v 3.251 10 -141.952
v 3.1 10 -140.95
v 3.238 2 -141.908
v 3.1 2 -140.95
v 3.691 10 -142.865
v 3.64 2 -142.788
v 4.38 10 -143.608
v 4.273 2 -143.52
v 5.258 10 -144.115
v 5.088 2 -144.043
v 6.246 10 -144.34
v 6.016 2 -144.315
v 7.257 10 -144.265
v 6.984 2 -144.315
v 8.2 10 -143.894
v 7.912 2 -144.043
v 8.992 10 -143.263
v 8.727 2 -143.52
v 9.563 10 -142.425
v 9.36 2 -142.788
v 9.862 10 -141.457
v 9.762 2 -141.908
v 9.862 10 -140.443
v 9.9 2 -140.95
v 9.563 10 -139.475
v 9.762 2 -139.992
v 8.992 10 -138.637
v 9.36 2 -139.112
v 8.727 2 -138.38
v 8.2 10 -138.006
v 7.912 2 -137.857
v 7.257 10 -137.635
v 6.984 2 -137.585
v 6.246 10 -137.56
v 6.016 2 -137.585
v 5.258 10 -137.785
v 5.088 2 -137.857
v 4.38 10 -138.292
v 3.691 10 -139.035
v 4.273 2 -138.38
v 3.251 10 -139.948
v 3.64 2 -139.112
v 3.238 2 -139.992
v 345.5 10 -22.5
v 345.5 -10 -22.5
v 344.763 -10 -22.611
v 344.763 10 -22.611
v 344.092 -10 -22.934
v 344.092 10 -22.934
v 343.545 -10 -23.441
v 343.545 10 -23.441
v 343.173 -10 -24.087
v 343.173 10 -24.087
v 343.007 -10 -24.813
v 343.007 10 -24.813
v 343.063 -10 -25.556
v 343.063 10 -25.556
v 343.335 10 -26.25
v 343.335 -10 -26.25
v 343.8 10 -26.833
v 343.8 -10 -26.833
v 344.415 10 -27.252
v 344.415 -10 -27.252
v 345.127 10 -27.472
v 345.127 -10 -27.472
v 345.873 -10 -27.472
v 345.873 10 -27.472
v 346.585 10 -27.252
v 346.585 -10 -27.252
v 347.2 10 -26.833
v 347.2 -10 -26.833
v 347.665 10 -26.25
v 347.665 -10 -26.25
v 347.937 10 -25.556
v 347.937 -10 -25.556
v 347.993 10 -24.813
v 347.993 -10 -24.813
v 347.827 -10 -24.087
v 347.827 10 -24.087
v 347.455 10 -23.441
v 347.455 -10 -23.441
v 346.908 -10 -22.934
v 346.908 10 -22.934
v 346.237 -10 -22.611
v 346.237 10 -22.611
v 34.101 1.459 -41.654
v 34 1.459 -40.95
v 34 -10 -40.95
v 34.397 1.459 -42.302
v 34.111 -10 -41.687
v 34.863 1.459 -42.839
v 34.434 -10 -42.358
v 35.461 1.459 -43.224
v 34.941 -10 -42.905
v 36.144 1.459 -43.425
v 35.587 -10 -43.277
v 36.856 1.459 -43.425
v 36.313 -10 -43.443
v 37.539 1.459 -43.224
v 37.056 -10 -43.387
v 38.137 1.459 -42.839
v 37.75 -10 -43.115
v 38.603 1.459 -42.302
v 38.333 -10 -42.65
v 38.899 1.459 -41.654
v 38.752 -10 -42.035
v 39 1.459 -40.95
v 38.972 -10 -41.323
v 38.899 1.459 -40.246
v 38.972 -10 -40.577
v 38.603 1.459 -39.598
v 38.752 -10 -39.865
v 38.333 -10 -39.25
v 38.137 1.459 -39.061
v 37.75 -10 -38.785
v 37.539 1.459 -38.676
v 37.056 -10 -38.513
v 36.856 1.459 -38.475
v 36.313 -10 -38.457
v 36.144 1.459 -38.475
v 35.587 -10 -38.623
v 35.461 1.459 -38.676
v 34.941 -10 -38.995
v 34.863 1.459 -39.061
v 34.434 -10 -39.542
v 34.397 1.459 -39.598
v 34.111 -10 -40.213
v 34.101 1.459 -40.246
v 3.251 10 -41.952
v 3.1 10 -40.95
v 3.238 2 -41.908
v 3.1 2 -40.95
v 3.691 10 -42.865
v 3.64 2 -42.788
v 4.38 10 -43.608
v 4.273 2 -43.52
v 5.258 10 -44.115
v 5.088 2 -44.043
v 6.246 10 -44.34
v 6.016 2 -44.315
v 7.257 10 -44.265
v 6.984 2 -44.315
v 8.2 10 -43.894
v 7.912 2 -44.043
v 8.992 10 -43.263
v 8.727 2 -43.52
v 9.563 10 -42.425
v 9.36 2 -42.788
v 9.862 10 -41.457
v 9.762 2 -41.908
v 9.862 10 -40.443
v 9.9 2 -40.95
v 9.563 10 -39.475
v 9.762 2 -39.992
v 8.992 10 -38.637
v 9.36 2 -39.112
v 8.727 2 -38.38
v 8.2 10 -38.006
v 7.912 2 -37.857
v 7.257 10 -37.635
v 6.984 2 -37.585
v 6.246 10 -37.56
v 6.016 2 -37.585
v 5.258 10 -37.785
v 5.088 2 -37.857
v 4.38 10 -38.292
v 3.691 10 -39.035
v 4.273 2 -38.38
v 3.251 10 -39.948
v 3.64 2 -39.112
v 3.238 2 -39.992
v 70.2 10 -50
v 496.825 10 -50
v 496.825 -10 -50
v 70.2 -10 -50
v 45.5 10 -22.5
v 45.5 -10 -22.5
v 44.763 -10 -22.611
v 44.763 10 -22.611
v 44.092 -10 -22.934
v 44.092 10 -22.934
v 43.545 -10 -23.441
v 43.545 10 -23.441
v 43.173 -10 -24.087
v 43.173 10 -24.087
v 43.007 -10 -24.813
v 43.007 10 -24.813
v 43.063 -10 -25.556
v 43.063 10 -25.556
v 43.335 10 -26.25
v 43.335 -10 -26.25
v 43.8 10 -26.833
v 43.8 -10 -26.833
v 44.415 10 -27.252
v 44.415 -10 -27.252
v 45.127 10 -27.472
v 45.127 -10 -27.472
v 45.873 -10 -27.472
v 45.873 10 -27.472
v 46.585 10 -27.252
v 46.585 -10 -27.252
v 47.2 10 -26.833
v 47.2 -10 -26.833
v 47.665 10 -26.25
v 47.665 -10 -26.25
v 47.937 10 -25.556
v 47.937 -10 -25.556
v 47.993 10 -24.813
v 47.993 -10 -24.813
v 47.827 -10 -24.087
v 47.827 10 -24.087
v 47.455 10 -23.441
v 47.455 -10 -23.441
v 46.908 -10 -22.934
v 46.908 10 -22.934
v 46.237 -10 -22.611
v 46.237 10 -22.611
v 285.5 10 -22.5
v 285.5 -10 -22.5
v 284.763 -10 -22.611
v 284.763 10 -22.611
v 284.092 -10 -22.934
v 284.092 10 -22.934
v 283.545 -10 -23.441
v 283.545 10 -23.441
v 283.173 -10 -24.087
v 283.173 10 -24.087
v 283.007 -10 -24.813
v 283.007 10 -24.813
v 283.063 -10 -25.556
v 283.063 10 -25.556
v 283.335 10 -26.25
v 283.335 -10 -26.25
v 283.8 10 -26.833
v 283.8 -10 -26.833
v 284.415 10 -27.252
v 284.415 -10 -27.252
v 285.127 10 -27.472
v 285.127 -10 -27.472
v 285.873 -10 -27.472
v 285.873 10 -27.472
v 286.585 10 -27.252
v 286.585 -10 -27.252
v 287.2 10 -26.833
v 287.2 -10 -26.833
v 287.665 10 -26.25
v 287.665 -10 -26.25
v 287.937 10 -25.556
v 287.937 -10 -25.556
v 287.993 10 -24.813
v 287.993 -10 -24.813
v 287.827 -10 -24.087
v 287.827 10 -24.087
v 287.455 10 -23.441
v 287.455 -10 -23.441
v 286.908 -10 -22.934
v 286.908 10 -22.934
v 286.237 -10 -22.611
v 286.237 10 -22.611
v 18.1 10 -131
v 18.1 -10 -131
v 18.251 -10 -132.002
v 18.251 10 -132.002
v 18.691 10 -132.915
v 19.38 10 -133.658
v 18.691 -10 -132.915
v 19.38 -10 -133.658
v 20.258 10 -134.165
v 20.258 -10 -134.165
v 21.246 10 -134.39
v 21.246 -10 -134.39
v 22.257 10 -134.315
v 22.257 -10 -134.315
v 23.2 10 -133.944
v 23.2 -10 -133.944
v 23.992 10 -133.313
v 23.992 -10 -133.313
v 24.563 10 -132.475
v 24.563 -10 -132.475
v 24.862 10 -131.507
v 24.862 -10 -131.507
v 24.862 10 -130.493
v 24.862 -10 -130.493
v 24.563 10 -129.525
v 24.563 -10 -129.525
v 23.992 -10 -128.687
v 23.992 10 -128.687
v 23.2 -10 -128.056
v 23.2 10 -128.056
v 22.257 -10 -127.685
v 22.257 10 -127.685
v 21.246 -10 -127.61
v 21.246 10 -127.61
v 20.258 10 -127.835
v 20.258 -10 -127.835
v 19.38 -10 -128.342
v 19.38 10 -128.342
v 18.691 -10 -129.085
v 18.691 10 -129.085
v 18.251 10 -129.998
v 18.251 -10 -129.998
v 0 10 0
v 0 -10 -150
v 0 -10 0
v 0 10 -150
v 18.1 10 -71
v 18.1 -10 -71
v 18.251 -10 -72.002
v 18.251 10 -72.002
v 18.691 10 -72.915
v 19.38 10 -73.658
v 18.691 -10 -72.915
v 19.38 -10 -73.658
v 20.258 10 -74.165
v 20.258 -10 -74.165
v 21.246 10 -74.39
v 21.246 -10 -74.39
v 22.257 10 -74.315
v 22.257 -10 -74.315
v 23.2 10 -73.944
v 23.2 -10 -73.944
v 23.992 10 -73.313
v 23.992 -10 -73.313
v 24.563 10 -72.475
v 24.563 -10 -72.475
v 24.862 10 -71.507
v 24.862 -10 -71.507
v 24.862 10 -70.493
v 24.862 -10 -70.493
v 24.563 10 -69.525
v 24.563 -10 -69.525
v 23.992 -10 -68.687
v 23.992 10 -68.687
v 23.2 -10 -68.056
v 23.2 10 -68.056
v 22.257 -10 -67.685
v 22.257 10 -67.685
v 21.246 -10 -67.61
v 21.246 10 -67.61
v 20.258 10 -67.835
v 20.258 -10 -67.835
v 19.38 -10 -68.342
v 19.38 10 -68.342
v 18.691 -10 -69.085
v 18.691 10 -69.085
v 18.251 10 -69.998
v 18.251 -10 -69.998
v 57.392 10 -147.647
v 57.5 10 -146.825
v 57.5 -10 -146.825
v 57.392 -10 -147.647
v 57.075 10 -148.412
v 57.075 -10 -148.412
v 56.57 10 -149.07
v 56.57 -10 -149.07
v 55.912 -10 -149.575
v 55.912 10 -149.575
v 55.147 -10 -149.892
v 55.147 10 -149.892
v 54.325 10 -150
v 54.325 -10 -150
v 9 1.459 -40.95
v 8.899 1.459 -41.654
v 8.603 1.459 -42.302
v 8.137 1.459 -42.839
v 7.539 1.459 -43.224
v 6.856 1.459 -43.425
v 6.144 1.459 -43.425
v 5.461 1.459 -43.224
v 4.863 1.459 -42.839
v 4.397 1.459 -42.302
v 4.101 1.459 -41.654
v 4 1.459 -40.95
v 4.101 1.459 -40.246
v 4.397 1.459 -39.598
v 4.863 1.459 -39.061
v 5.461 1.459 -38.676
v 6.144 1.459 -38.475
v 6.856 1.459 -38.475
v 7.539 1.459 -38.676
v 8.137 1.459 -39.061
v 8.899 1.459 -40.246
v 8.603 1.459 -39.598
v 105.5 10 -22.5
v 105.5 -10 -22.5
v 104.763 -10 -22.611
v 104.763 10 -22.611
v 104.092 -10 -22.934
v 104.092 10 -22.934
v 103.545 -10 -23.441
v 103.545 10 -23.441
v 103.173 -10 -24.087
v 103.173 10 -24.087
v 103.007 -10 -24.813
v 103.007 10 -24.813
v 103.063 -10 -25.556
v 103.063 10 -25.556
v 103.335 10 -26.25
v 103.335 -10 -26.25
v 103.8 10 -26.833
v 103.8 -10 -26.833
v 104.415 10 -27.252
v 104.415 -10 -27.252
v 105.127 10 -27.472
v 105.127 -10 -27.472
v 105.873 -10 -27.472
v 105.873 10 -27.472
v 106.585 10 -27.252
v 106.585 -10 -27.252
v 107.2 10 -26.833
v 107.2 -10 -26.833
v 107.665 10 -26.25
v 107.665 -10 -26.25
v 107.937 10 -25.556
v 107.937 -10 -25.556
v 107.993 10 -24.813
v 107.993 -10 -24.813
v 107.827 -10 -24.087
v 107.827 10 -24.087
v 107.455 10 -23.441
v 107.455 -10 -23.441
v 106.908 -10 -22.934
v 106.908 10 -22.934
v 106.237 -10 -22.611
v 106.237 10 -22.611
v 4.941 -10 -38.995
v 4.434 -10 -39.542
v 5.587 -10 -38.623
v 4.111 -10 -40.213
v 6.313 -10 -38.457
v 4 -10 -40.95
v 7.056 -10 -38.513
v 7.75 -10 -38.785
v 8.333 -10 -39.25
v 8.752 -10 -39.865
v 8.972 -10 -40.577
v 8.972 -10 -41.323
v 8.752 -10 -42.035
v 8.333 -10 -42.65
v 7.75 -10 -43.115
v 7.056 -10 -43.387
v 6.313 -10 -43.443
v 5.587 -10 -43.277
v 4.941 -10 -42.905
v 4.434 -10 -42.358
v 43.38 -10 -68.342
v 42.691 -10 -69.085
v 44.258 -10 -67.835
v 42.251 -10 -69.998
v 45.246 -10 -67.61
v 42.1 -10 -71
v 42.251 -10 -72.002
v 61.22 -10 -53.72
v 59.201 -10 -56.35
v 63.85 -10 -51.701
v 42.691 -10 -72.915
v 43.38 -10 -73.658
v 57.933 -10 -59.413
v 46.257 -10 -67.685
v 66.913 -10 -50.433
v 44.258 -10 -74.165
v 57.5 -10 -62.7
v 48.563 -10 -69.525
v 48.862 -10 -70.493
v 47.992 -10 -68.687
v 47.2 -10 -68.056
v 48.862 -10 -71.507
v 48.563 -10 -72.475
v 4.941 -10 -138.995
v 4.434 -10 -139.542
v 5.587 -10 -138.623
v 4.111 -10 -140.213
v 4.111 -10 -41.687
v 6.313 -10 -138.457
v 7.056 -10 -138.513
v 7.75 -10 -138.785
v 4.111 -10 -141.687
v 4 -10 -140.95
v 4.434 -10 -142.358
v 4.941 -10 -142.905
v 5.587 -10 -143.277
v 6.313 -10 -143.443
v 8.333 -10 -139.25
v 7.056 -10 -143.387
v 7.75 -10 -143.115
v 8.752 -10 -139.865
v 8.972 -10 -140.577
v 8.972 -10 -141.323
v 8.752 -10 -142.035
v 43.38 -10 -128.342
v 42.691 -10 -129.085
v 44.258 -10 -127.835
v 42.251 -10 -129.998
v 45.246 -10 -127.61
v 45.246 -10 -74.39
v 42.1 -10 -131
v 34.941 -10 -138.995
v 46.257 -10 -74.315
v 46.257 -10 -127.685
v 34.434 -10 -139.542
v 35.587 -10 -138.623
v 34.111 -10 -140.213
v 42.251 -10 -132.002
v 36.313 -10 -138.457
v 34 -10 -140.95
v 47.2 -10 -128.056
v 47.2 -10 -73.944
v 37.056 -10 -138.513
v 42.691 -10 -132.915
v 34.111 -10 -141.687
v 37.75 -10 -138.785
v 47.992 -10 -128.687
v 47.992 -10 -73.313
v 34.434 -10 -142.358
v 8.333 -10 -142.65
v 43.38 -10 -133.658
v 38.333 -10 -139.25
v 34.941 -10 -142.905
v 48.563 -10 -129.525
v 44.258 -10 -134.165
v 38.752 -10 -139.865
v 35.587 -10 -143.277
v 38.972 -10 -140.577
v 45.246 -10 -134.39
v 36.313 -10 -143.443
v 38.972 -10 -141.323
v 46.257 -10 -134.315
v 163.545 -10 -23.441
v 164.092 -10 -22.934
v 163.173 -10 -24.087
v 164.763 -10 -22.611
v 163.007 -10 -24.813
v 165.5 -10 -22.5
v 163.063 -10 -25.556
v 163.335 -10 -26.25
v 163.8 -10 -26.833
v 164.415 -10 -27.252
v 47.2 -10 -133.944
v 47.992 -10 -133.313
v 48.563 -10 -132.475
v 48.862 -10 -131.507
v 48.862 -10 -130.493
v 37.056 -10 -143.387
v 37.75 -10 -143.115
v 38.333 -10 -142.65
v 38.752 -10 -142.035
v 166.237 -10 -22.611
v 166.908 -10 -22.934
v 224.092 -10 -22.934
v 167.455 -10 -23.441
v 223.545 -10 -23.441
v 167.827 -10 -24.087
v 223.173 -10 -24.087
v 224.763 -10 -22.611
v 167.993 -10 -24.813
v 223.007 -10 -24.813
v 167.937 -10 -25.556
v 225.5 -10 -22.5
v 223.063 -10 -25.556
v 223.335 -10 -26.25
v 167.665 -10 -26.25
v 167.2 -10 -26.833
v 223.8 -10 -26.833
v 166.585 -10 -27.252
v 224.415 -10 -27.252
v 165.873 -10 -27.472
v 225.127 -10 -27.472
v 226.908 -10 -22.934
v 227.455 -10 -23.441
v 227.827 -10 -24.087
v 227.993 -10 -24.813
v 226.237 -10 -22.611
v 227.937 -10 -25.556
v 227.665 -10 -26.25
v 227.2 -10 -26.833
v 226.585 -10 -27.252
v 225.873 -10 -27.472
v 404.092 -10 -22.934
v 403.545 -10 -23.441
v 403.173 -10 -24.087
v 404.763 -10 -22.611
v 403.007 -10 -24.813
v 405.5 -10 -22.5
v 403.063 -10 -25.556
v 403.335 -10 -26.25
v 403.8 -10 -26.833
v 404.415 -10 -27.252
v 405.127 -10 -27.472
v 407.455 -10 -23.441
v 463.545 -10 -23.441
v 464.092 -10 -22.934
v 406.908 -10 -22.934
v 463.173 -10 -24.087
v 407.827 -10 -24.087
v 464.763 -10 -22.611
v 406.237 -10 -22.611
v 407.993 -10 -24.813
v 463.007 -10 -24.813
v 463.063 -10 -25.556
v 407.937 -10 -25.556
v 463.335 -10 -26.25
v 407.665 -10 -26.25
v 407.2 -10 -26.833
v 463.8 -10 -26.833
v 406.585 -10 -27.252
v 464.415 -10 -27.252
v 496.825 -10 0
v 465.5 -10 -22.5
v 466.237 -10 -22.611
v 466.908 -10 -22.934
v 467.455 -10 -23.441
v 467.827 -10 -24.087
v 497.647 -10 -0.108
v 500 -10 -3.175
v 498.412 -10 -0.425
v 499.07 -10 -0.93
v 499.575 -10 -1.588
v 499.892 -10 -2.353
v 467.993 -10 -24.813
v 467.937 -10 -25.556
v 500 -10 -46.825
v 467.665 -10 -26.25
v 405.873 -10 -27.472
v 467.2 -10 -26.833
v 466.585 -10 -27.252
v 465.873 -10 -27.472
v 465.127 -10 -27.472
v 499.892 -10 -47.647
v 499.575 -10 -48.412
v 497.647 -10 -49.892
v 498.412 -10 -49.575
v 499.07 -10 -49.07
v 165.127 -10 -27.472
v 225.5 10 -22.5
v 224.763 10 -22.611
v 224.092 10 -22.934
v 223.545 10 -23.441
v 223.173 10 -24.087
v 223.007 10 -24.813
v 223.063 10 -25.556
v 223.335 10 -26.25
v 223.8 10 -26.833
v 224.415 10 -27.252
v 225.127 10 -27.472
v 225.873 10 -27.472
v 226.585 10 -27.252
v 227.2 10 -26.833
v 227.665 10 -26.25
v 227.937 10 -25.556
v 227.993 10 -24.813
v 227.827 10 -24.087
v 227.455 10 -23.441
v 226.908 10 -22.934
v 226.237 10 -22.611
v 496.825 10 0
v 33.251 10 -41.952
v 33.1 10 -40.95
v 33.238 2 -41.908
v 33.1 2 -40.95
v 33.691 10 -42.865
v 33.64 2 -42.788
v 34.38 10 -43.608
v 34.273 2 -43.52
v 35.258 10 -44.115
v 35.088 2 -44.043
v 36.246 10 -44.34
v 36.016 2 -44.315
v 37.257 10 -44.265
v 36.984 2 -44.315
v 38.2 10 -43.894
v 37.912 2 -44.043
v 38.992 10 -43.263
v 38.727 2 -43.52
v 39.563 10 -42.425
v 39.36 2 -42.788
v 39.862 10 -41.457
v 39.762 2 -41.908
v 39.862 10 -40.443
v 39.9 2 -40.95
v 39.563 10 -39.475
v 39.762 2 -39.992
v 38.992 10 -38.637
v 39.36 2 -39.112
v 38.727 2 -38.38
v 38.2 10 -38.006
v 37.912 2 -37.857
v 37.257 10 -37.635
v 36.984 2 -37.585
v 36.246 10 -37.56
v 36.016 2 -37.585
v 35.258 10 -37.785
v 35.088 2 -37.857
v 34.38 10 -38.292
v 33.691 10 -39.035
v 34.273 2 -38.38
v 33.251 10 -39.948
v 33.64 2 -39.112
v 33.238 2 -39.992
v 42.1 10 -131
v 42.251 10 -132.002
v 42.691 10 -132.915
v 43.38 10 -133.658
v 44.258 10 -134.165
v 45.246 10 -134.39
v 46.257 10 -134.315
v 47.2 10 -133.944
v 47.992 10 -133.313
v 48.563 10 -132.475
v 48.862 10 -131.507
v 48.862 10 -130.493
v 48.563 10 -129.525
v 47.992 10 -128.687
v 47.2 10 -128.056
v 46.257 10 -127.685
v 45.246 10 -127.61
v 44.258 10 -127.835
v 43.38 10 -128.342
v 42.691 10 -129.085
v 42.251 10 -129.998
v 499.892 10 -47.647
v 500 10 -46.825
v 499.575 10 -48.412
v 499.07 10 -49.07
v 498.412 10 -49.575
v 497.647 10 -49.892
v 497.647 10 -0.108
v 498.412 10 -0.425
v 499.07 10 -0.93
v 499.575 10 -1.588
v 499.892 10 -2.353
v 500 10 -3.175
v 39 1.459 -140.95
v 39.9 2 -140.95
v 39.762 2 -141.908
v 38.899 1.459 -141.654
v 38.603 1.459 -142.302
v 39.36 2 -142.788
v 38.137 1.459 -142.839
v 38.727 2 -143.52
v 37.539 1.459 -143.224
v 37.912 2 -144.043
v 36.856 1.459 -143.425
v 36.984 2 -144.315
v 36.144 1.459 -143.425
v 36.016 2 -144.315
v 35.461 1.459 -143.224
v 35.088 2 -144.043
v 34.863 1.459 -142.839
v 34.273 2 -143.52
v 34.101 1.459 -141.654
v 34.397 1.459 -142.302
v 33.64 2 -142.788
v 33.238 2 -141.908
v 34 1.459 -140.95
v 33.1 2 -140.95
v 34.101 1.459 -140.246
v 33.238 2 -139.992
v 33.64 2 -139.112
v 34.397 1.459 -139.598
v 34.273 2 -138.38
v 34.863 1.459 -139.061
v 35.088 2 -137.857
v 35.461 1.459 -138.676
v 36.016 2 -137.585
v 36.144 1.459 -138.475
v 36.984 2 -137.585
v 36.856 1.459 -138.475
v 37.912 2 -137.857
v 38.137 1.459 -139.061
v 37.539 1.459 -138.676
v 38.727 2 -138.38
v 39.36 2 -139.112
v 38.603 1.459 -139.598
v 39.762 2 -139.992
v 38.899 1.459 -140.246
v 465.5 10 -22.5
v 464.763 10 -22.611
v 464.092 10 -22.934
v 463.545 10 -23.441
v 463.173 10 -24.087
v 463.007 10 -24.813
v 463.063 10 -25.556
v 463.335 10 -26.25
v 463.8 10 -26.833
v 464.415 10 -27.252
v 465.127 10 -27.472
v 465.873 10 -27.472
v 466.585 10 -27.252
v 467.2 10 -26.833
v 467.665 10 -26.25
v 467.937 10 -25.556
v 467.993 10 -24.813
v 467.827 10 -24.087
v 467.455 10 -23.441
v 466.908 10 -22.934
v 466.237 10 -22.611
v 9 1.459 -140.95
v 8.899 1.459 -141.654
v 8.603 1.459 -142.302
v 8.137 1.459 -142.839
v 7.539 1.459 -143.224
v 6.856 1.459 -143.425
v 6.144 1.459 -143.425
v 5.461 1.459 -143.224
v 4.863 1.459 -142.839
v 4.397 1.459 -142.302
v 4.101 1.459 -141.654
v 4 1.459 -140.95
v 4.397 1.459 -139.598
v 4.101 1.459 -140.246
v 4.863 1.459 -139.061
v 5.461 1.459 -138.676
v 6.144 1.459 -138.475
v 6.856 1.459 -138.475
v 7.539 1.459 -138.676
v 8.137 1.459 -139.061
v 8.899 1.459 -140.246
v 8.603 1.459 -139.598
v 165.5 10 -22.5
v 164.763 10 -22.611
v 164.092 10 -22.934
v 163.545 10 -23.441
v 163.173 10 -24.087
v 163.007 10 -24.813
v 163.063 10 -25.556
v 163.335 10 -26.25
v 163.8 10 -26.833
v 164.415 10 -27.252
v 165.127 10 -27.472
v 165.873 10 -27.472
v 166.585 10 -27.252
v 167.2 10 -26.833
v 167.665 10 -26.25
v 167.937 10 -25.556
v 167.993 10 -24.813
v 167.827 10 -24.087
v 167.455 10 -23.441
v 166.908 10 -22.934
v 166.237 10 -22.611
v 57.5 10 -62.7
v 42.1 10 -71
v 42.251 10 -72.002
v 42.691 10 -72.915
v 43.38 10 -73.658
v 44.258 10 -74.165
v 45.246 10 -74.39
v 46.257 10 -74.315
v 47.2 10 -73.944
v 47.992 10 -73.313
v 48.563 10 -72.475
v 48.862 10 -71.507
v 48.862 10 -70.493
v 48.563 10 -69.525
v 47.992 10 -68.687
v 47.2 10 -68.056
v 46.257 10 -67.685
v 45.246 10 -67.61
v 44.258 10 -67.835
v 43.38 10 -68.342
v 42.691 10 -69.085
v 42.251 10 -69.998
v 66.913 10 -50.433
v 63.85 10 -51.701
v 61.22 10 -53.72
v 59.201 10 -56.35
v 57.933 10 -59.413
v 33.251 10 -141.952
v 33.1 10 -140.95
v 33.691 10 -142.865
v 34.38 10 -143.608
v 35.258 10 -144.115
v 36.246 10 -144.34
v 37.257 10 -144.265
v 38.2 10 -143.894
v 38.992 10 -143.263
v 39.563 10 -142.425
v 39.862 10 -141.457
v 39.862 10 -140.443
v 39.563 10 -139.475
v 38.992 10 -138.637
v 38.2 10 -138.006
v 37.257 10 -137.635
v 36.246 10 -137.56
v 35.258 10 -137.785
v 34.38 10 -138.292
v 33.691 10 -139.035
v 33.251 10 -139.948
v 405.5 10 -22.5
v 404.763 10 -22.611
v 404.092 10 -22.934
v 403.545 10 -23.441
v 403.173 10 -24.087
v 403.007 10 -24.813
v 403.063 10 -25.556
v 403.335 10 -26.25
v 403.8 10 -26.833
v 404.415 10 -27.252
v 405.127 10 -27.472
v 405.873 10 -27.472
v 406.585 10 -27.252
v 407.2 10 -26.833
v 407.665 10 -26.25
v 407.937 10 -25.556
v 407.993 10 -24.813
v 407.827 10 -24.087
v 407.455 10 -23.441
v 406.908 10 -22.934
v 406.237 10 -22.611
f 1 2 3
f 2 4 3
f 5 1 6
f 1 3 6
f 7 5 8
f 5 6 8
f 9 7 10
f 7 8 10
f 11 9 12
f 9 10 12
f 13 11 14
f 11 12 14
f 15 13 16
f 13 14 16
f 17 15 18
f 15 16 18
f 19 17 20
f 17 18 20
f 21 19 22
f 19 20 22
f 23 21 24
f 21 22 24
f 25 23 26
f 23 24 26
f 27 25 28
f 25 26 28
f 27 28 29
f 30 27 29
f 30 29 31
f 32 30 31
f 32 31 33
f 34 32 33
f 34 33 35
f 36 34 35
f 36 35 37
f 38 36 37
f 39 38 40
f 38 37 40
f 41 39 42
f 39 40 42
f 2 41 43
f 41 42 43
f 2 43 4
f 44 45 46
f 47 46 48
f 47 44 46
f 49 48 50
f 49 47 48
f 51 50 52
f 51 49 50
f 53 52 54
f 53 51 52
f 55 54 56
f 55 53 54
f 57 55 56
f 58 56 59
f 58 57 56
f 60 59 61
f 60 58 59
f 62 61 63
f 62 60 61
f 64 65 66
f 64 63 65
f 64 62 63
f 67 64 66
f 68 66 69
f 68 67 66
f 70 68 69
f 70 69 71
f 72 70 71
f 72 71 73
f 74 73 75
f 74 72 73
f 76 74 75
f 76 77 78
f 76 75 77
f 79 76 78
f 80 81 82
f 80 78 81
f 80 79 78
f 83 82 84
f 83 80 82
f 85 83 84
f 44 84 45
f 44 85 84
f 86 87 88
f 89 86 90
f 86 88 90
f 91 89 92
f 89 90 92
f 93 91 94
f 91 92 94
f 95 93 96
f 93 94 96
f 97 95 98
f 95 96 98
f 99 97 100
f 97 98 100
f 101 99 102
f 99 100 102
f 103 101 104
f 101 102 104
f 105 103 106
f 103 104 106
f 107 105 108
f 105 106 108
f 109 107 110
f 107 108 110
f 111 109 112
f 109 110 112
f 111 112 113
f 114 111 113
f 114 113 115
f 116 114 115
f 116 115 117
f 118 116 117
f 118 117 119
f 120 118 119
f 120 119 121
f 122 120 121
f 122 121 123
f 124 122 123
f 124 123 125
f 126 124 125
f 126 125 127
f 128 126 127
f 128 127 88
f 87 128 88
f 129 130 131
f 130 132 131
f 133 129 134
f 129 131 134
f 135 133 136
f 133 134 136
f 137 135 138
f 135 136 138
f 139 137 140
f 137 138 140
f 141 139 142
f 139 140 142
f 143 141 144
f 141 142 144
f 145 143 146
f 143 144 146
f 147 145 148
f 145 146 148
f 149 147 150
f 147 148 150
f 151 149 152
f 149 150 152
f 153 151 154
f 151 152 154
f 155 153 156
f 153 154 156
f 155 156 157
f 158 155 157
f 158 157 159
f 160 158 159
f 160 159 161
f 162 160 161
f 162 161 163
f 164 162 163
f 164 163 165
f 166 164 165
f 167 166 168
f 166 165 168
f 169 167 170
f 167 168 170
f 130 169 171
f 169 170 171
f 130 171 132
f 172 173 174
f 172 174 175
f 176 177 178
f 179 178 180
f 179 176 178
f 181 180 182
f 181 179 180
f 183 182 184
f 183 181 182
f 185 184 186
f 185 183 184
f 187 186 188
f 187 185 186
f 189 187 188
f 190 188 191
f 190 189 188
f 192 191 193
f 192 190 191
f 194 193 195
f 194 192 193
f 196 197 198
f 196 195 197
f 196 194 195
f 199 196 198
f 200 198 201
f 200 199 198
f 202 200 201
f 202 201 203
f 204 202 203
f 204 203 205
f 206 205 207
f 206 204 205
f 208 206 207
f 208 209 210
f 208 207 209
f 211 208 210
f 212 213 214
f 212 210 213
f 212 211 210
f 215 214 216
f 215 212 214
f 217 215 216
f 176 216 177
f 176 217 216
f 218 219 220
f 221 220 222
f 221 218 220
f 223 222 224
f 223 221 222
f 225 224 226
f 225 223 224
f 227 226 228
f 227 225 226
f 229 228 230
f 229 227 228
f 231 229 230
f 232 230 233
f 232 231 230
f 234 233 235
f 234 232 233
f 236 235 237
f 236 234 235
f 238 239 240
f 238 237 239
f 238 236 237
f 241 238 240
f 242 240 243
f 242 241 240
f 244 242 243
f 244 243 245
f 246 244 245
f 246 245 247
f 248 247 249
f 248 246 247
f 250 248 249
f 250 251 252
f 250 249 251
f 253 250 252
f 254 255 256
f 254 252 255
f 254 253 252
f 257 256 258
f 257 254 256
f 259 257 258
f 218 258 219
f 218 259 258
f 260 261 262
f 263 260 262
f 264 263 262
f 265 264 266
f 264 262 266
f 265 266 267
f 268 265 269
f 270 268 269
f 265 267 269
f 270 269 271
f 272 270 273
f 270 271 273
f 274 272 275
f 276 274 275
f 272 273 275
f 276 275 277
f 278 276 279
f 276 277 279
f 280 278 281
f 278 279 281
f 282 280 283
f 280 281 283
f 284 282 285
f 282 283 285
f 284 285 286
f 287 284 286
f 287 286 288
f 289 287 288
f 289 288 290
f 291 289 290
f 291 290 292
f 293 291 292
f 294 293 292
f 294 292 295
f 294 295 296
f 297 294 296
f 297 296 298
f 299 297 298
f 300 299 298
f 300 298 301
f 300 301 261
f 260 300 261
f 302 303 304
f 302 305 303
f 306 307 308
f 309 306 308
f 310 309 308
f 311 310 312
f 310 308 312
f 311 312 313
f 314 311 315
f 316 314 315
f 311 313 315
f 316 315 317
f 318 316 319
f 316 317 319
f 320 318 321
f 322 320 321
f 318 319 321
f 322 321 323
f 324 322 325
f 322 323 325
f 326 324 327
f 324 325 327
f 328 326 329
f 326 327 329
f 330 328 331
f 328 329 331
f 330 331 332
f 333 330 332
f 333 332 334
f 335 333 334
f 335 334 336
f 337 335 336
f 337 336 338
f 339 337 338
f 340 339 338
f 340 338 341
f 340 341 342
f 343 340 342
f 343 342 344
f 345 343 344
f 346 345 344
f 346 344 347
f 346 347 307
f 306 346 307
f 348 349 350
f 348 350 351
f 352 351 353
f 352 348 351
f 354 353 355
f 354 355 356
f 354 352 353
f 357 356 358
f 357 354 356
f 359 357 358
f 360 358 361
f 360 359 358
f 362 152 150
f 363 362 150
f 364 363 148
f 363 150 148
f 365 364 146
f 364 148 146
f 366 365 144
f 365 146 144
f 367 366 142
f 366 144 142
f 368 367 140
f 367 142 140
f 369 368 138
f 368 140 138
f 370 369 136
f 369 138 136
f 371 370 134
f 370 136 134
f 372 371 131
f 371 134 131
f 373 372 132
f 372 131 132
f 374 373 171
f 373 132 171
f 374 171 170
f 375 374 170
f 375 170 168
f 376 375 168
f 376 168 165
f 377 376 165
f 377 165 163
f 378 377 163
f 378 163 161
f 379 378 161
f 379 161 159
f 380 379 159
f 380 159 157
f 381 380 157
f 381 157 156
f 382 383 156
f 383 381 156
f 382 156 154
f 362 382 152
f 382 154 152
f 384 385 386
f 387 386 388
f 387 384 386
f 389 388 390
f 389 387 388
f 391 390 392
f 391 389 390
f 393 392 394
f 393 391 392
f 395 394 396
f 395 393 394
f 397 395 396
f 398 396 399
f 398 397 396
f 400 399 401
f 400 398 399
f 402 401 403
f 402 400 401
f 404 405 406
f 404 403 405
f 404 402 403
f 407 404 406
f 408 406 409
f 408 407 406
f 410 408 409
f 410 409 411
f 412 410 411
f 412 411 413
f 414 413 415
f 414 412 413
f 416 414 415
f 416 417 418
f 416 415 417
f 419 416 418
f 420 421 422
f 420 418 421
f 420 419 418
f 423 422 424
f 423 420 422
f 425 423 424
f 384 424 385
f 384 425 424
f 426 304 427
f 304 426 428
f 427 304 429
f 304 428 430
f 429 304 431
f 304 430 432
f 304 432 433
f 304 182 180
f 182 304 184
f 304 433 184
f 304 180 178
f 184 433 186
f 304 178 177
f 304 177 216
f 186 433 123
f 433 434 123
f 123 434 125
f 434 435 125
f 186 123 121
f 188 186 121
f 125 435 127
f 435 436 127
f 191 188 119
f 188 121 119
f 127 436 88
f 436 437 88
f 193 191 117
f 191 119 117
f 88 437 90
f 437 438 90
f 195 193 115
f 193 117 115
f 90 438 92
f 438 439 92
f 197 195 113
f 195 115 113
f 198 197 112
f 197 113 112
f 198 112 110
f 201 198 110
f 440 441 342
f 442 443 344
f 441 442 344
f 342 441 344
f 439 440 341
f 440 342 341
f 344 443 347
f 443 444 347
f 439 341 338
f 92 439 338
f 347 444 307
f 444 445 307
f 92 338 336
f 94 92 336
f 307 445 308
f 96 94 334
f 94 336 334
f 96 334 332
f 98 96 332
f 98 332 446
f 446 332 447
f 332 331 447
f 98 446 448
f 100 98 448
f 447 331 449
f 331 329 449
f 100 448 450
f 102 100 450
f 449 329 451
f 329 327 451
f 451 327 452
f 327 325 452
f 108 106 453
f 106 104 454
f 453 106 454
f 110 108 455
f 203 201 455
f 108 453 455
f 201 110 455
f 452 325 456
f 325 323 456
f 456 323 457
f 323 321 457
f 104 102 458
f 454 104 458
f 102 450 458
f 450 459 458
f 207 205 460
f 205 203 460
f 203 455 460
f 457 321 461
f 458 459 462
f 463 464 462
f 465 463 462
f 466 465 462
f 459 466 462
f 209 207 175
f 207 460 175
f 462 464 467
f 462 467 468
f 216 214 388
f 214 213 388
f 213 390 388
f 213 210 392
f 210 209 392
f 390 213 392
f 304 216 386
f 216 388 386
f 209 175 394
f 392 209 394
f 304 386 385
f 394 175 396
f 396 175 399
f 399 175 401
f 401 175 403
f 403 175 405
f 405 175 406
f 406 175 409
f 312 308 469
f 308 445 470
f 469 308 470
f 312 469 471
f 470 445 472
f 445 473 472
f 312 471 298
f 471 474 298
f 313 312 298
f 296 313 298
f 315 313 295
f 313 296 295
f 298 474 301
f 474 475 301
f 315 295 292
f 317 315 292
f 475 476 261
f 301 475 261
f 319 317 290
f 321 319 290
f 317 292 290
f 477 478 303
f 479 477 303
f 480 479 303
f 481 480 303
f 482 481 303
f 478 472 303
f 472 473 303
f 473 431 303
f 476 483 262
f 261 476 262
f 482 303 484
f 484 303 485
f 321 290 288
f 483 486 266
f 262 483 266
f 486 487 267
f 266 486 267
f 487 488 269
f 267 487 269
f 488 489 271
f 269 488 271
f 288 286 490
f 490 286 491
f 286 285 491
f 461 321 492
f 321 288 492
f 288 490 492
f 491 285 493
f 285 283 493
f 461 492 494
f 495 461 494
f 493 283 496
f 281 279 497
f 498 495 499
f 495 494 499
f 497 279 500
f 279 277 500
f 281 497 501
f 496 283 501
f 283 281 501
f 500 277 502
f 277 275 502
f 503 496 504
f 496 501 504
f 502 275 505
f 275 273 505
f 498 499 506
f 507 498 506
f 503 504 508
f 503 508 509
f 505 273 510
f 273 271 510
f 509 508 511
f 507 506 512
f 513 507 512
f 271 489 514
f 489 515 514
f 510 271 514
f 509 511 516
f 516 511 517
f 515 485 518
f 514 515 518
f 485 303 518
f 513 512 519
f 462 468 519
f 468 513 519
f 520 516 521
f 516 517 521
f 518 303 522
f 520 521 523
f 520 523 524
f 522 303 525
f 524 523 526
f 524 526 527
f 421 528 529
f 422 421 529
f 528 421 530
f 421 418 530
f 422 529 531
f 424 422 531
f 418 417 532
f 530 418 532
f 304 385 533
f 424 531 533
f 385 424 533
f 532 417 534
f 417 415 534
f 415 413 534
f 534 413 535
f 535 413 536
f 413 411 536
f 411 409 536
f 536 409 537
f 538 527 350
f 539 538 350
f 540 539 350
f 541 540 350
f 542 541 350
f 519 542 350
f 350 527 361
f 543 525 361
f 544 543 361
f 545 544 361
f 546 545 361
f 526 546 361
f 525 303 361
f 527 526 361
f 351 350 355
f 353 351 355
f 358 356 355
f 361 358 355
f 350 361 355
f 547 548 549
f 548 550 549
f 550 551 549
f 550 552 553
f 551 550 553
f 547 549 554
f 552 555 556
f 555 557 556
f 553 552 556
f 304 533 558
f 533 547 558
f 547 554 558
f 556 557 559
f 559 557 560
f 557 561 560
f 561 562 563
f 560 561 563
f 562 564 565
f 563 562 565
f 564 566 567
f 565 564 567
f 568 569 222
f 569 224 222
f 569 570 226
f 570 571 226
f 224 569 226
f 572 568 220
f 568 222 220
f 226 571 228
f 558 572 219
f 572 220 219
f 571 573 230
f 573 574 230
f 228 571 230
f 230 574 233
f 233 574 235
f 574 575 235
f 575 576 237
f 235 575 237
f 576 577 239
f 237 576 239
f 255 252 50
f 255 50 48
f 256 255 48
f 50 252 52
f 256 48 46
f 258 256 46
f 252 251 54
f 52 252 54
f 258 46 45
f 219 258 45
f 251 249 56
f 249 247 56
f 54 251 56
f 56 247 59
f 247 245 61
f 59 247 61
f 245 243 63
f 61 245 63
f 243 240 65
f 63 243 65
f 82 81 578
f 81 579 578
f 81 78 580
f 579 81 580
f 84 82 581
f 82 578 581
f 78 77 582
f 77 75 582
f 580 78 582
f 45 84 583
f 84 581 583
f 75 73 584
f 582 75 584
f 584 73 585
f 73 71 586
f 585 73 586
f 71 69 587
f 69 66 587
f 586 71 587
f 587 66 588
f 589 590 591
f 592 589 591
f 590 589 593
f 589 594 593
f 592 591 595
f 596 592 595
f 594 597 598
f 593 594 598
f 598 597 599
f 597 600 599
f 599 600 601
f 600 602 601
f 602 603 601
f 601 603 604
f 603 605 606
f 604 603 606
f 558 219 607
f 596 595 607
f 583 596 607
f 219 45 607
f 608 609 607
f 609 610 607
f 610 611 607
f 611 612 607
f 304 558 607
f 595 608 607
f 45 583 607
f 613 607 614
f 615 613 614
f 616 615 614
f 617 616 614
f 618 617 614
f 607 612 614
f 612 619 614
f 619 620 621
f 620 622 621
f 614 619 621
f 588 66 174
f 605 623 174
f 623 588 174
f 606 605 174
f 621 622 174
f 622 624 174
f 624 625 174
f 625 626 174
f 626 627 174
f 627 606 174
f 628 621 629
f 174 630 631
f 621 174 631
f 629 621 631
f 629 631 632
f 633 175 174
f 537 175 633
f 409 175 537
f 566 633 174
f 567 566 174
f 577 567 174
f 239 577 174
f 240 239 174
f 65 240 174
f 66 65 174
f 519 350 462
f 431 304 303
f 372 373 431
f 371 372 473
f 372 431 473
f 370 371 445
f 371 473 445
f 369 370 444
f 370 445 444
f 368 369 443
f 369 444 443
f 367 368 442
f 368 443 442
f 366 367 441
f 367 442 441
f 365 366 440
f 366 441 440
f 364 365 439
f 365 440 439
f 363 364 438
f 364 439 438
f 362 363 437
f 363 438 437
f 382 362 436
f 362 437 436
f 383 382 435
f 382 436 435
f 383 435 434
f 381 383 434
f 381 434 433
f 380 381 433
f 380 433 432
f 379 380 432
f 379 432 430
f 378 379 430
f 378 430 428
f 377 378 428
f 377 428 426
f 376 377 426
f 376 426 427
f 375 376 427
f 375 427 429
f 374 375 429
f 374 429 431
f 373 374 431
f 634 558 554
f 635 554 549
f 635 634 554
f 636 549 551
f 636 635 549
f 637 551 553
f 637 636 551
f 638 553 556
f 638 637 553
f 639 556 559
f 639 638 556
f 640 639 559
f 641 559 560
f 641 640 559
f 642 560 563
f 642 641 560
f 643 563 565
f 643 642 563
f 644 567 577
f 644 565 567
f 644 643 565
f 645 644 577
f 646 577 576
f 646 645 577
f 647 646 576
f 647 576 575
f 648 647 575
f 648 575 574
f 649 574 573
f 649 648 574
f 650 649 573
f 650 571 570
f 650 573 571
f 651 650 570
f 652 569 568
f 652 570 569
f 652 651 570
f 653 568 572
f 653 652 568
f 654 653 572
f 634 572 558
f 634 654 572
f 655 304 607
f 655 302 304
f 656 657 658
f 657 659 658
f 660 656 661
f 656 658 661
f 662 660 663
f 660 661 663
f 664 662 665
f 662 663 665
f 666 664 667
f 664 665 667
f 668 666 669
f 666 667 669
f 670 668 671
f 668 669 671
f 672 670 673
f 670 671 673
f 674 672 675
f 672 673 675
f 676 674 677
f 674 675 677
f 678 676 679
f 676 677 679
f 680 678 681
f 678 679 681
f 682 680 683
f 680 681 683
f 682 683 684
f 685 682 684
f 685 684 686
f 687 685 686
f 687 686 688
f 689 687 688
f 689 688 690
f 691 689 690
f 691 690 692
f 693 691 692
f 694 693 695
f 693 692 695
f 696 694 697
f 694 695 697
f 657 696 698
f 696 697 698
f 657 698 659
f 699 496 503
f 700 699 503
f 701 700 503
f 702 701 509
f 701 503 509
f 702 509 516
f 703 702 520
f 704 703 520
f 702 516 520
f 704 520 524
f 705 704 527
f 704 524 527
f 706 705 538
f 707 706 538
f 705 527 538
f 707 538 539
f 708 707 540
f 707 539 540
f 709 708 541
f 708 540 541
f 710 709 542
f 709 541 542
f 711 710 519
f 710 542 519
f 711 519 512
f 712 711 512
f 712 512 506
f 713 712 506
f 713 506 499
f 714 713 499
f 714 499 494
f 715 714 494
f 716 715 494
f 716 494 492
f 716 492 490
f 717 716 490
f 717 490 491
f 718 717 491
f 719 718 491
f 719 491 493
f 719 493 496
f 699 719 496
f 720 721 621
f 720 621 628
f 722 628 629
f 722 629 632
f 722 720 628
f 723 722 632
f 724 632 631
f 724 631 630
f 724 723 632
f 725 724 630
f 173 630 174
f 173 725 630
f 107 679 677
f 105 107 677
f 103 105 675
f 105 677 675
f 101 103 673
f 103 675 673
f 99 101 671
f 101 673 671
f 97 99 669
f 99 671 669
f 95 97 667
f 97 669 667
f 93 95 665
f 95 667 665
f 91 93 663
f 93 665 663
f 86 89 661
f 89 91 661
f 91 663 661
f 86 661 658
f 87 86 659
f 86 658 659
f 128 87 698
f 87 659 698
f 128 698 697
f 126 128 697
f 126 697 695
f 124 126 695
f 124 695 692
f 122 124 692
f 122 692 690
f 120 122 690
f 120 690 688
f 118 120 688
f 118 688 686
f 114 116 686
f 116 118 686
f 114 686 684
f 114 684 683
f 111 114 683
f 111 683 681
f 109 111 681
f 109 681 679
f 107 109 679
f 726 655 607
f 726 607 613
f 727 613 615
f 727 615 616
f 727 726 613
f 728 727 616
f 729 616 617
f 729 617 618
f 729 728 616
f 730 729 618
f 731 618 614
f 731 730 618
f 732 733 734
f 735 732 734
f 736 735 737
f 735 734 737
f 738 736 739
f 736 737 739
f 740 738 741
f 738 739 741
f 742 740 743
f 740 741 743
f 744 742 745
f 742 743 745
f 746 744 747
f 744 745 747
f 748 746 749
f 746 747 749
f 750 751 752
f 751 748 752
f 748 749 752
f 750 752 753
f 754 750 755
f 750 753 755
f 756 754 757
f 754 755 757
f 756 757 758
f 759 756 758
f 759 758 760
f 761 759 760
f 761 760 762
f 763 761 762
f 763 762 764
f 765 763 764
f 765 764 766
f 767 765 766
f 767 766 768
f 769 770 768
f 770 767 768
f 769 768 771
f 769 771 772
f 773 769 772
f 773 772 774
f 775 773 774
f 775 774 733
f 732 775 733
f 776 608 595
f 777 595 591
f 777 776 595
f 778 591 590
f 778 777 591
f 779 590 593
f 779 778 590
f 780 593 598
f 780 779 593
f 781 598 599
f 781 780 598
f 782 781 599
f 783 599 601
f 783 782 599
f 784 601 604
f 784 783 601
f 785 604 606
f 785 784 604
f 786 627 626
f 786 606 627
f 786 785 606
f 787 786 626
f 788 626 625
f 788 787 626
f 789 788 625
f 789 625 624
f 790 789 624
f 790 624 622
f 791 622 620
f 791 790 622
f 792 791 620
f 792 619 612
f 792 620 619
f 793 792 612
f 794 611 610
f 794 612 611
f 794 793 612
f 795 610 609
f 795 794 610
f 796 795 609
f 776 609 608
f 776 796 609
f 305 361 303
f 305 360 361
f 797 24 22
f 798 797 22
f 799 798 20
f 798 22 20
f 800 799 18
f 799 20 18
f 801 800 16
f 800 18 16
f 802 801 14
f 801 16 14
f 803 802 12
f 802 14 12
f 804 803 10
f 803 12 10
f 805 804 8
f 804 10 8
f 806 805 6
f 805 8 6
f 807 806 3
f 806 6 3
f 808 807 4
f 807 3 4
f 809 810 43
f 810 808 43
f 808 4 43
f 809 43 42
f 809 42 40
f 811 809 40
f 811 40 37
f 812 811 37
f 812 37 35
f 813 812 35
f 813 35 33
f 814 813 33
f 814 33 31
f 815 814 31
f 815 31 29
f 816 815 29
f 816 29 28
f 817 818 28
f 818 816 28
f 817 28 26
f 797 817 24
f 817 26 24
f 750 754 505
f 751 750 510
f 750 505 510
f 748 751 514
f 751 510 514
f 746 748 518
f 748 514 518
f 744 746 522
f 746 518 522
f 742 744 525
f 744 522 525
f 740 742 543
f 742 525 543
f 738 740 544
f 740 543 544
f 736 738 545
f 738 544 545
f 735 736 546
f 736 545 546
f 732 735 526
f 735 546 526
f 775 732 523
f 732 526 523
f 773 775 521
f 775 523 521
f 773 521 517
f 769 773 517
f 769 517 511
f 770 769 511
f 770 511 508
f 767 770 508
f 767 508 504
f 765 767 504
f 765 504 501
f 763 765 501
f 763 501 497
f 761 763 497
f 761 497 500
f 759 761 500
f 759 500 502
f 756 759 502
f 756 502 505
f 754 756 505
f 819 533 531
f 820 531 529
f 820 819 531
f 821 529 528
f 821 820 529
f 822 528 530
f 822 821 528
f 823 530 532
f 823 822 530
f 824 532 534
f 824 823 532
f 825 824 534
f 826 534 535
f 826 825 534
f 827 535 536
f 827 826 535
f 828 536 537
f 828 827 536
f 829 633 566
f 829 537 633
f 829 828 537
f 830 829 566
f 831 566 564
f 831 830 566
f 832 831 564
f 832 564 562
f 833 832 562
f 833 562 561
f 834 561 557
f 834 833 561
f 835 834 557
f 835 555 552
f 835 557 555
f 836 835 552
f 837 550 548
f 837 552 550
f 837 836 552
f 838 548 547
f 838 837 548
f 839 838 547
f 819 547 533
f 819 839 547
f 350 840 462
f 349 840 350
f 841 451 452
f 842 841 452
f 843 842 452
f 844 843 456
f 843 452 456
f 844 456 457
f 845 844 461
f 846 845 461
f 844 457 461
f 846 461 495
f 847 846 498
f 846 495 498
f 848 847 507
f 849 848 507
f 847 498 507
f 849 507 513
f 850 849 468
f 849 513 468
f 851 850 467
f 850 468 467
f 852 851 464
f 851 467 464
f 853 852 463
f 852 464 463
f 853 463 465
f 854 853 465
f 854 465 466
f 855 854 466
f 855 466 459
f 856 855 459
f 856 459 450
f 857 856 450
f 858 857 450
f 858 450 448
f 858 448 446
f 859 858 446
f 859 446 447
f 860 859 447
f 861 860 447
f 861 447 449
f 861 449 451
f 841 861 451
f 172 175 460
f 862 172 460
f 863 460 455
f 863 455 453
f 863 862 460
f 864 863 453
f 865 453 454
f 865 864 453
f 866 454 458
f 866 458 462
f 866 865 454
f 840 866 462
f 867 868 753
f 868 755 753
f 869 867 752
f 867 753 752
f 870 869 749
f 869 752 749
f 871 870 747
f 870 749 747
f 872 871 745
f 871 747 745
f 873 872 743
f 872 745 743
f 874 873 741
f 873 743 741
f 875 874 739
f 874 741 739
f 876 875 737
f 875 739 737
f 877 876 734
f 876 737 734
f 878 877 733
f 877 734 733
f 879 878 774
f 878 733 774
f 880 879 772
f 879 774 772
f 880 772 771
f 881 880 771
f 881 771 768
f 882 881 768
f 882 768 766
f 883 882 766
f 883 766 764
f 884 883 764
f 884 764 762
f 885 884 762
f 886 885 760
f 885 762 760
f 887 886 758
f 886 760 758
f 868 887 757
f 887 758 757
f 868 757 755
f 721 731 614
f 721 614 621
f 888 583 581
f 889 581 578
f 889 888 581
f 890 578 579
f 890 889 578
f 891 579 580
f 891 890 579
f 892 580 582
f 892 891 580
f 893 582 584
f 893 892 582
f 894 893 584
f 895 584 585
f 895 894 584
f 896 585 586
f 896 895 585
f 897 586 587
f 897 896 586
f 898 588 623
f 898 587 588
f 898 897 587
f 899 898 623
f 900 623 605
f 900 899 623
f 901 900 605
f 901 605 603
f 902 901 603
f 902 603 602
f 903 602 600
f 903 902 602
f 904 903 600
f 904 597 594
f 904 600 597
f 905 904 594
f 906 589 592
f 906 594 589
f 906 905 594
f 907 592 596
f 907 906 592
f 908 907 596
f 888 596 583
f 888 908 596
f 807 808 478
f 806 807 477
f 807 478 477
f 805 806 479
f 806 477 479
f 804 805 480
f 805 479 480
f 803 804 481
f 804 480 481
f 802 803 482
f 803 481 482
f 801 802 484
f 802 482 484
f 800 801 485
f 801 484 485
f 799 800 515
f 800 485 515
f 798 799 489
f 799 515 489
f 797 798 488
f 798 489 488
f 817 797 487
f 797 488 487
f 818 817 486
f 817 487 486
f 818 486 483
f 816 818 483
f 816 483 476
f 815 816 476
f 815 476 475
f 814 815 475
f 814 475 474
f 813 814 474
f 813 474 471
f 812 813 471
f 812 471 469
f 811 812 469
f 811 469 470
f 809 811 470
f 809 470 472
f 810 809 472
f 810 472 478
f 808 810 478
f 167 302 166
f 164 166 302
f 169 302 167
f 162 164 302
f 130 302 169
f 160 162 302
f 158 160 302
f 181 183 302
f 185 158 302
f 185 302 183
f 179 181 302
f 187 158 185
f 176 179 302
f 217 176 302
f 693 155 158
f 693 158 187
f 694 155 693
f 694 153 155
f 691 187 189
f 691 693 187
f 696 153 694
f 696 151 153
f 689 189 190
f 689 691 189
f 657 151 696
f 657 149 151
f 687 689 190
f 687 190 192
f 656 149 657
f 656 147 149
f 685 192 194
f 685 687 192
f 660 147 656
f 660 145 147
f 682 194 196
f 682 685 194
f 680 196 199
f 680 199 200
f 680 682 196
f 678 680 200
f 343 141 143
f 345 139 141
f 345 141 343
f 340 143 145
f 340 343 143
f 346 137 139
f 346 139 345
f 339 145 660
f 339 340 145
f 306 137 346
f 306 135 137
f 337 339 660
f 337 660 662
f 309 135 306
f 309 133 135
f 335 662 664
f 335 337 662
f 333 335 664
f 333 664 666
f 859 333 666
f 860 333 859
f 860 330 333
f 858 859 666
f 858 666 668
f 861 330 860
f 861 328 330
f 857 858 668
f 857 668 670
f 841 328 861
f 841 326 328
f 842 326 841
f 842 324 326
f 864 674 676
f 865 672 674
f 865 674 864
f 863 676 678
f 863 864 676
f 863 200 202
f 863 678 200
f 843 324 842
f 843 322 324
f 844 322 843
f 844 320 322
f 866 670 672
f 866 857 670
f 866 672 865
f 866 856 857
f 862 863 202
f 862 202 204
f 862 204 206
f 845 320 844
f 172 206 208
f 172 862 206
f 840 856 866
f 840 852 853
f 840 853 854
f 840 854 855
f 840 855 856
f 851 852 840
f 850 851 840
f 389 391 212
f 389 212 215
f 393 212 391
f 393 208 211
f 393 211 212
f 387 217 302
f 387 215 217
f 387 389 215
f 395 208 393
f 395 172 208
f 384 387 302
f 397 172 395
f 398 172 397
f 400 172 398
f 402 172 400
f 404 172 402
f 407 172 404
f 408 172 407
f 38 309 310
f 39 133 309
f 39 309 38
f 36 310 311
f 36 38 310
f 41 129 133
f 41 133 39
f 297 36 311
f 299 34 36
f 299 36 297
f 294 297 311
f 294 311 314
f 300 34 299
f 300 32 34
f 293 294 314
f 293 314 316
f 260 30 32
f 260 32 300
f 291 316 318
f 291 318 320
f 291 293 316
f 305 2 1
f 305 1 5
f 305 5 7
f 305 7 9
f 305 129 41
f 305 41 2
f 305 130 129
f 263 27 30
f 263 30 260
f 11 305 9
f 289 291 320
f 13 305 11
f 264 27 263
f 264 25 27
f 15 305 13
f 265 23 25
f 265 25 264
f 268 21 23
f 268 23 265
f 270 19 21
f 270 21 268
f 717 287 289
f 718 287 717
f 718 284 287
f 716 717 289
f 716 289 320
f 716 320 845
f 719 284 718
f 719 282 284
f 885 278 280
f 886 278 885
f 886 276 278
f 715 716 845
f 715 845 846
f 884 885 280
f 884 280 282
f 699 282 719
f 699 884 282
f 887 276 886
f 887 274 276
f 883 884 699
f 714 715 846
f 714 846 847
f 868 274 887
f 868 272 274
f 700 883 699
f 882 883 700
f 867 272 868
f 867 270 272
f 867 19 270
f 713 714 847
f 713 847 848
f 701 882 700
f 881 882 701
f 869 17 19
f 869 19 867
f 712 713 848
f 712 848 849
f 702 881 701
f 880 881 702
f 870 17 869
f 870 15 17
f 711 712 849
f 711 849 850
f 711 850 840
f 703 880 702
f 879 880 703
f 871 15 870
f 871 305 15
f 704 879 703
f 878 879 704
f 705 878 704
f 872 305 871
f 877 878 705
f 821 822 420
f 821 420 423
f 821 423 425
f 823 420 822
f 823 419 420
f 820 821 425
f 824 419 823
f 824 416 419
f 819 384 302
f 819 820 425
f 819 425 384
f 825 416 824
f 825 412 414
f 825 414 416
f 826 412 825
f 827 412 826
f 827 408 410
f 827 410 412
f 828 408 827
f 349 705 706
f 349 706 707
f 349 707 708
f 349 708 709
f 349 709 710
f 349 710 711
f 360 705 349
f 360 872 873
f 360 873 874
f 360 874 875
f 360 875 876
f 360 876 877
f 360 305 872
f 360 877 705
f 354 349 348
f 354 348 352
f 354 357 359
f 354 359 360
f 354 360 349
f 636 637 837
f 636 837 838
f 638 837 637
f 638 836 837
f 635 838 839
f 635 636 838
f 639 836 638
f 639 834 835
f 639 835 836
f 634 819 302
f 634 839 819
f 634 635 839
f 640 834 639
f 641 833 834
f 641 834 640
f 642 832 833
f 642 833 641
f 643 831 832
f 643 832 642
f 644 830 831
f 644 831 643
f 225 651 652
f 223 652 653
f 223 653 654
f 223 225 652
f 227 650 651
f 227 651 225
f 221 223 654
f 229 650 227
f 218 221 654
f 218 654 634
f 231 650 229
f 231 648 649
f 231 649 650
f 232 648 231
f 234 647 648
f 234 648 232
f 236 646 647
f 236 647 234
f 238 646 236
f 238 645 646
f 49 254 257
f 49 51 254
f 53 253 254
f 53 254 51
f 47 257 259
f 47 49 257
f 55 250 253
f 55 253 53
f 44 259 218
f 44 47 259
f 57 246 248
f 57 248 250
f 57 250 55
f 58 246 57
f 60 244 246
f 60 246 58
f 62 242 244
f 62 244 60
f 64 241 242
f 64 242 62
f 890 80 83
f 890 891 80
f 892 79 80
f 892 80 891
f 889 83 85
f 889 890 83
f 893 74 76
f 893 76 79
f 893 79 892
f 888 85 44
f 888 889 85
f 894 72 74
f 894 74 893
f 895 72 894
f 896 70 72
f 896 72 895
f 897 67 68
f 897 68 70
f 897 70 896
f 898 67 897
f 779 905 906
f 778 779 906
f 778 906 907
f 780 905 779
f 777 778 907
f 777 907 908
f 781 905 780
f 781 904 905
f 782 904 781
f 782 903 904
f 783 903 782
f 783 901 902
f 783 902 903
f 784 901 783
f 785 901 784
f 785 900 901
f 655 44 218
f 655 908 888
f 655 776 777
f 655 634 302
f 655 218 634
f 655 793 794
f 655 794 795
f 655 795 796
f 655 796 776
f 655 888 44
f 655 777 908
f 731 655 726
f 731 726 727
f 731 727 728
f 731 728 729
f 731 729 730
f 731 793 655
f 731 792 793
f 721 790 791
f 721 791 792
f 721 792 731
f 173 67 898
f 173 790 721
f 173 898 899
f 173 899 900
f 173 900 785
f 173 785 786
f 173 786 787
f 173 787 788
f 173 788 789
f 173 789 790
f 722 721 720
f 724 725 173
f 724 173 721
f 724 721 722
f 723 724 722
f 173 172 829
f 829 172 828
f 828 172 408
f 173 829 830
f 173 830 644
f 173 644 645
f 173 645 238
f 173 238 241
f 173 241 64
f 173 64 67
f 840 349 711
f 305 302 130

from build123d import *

# Parameters (mm, degrees)
BOSS_EXTRUDE1_DEPTH            = 10
LPATTERN2_COUNT                = 8
LPATTERN2_PITCH                = 60
M8_TAPPED_HOLE2_D              = 6.8
F_6_8_6_8_DIAMETER_HOLE1_D     = 6.8
F_6_8_6_8_DIAMETER_HOLE1_DEPTH = 8.0000094
F_6_8_6_8_DIAMETER_HOLE1_TIP   = 2.042926105
M6_TAPPED_HOLE1_D              = 5


with BuildPart() as part:
    # Sketch1 → Boss-Extrude1 (new, symmetric)
    with BuildSketch(Plane(origin=(0, 0, 0), x_dir=(1, 0, 0), z_dir=(0, 1, 0))):
        with BuildLine():
            Line((0, 0), (496.825, 0))
            ThreePointArc((496.825, 0), (499.07006403, 0.92993597), (500, 3.175))
            Line((500, 3.175), (500, 46.825))
            ThreePointArc((500, 46.825), (499.07006403, 49.07006403), (496.825, 50))
            Line((496.825, 50), (70.2, 50))
            ThreePointArc((70.2, 50), (61.219743879, 53.719743879), (57.5, 62.7))
            Line((57.5, 62.7), (57.5, 146.825))
            ThreePointArc((57.5, 146.825), (56.57006403, 149.07006403), (54.325, 150))
            Line((54.325, 150), (0, 150))
            Line((0, 150), (0, 0))
        make_face()
    extrude(amount=BOSS_EXTRUDE1_DEPTH, both=True)

    # Sketch3 → M6 Tapped Hole2 (revolve, cut)
    with BuildSketch(Plane(origin=(45.5, 10, -25), x_dir=(0, 0, 1), z_dir=(1, 0, 0))):
        Polygon((0, 0), (0, 29.492951548), (2.5, 27.9908), (2.5, 0), align=None)
    m6_tapped_hole2 = revolve(axis=Axis((45.5, 16.35, -25), (0, -1, 0)), mode=Mode.SUBTRACT)

    # LPattern2: M6 Tapped Hole2 ×8
    with Locations(*[(i * LPATTERN2_PITCH, 0, 0) for i in range(1, LPATTERN2_COUNT)]):
        add(m6_tapped_hole2, mode=Mode.SUBTRACT)

    # M8 Tapped Hole2 (through all)
    with Locations(Plane(origin=(0, 10, 0), x_dir=(1, 0, 0), z_dir=(0, 1, 0))):
        with Locations((45.5, 131), (21.5, 131), (45.5, 71), (21.5, 71)):
            Hole(M8_TAPPED_HOLE2_D / 2)

    # Ø6.8 (6.8) Diameter Hole1
    with Locations(Plane(origin=(0, 10, 0), x_dir=(1, 0, 0), z_dir=(0, 1, 0))):
        with Locations((36.5, 140.950000036), (6.5, 140.950000036), (6.5, 40.950000036), (36.5, 40.950000036)):
            Hole(F_6_8_6_8_DIAMETER_HOLE1_D / 2, depth=F_6_8_6_8_DIAMETER_HOLE1_DEPTH)
            with Locations((0, 0, -(F_6_8_6_8_DIAMETER_HOLE1_DEPTH + F_6_8_6_8_DIAMETER_HOLE1_TIP / 2))):  # 118° drill point
                Cone(0, F_6_8_6_8_DIAMETER_HOLE1_D / 2, F_6_8_6_8_DIAMETER_HOLE1_TIP, mode=Mode.SUBTRACT)

    # M6 Tapped Hole1 (through all)
    with Locations(Plane(origin=(0, 10, 0), x_dir=(1, 0, 0), z_dir=(0, 1, 0))):
        with Locations((6.5, 140.950000036), (36.5, 140.950000036), (36.5, 40.950000036), (6.5, 40.950000036)):
            Hole(M6_TAPPED_HOLE1_D / 2)


solid = part.part
